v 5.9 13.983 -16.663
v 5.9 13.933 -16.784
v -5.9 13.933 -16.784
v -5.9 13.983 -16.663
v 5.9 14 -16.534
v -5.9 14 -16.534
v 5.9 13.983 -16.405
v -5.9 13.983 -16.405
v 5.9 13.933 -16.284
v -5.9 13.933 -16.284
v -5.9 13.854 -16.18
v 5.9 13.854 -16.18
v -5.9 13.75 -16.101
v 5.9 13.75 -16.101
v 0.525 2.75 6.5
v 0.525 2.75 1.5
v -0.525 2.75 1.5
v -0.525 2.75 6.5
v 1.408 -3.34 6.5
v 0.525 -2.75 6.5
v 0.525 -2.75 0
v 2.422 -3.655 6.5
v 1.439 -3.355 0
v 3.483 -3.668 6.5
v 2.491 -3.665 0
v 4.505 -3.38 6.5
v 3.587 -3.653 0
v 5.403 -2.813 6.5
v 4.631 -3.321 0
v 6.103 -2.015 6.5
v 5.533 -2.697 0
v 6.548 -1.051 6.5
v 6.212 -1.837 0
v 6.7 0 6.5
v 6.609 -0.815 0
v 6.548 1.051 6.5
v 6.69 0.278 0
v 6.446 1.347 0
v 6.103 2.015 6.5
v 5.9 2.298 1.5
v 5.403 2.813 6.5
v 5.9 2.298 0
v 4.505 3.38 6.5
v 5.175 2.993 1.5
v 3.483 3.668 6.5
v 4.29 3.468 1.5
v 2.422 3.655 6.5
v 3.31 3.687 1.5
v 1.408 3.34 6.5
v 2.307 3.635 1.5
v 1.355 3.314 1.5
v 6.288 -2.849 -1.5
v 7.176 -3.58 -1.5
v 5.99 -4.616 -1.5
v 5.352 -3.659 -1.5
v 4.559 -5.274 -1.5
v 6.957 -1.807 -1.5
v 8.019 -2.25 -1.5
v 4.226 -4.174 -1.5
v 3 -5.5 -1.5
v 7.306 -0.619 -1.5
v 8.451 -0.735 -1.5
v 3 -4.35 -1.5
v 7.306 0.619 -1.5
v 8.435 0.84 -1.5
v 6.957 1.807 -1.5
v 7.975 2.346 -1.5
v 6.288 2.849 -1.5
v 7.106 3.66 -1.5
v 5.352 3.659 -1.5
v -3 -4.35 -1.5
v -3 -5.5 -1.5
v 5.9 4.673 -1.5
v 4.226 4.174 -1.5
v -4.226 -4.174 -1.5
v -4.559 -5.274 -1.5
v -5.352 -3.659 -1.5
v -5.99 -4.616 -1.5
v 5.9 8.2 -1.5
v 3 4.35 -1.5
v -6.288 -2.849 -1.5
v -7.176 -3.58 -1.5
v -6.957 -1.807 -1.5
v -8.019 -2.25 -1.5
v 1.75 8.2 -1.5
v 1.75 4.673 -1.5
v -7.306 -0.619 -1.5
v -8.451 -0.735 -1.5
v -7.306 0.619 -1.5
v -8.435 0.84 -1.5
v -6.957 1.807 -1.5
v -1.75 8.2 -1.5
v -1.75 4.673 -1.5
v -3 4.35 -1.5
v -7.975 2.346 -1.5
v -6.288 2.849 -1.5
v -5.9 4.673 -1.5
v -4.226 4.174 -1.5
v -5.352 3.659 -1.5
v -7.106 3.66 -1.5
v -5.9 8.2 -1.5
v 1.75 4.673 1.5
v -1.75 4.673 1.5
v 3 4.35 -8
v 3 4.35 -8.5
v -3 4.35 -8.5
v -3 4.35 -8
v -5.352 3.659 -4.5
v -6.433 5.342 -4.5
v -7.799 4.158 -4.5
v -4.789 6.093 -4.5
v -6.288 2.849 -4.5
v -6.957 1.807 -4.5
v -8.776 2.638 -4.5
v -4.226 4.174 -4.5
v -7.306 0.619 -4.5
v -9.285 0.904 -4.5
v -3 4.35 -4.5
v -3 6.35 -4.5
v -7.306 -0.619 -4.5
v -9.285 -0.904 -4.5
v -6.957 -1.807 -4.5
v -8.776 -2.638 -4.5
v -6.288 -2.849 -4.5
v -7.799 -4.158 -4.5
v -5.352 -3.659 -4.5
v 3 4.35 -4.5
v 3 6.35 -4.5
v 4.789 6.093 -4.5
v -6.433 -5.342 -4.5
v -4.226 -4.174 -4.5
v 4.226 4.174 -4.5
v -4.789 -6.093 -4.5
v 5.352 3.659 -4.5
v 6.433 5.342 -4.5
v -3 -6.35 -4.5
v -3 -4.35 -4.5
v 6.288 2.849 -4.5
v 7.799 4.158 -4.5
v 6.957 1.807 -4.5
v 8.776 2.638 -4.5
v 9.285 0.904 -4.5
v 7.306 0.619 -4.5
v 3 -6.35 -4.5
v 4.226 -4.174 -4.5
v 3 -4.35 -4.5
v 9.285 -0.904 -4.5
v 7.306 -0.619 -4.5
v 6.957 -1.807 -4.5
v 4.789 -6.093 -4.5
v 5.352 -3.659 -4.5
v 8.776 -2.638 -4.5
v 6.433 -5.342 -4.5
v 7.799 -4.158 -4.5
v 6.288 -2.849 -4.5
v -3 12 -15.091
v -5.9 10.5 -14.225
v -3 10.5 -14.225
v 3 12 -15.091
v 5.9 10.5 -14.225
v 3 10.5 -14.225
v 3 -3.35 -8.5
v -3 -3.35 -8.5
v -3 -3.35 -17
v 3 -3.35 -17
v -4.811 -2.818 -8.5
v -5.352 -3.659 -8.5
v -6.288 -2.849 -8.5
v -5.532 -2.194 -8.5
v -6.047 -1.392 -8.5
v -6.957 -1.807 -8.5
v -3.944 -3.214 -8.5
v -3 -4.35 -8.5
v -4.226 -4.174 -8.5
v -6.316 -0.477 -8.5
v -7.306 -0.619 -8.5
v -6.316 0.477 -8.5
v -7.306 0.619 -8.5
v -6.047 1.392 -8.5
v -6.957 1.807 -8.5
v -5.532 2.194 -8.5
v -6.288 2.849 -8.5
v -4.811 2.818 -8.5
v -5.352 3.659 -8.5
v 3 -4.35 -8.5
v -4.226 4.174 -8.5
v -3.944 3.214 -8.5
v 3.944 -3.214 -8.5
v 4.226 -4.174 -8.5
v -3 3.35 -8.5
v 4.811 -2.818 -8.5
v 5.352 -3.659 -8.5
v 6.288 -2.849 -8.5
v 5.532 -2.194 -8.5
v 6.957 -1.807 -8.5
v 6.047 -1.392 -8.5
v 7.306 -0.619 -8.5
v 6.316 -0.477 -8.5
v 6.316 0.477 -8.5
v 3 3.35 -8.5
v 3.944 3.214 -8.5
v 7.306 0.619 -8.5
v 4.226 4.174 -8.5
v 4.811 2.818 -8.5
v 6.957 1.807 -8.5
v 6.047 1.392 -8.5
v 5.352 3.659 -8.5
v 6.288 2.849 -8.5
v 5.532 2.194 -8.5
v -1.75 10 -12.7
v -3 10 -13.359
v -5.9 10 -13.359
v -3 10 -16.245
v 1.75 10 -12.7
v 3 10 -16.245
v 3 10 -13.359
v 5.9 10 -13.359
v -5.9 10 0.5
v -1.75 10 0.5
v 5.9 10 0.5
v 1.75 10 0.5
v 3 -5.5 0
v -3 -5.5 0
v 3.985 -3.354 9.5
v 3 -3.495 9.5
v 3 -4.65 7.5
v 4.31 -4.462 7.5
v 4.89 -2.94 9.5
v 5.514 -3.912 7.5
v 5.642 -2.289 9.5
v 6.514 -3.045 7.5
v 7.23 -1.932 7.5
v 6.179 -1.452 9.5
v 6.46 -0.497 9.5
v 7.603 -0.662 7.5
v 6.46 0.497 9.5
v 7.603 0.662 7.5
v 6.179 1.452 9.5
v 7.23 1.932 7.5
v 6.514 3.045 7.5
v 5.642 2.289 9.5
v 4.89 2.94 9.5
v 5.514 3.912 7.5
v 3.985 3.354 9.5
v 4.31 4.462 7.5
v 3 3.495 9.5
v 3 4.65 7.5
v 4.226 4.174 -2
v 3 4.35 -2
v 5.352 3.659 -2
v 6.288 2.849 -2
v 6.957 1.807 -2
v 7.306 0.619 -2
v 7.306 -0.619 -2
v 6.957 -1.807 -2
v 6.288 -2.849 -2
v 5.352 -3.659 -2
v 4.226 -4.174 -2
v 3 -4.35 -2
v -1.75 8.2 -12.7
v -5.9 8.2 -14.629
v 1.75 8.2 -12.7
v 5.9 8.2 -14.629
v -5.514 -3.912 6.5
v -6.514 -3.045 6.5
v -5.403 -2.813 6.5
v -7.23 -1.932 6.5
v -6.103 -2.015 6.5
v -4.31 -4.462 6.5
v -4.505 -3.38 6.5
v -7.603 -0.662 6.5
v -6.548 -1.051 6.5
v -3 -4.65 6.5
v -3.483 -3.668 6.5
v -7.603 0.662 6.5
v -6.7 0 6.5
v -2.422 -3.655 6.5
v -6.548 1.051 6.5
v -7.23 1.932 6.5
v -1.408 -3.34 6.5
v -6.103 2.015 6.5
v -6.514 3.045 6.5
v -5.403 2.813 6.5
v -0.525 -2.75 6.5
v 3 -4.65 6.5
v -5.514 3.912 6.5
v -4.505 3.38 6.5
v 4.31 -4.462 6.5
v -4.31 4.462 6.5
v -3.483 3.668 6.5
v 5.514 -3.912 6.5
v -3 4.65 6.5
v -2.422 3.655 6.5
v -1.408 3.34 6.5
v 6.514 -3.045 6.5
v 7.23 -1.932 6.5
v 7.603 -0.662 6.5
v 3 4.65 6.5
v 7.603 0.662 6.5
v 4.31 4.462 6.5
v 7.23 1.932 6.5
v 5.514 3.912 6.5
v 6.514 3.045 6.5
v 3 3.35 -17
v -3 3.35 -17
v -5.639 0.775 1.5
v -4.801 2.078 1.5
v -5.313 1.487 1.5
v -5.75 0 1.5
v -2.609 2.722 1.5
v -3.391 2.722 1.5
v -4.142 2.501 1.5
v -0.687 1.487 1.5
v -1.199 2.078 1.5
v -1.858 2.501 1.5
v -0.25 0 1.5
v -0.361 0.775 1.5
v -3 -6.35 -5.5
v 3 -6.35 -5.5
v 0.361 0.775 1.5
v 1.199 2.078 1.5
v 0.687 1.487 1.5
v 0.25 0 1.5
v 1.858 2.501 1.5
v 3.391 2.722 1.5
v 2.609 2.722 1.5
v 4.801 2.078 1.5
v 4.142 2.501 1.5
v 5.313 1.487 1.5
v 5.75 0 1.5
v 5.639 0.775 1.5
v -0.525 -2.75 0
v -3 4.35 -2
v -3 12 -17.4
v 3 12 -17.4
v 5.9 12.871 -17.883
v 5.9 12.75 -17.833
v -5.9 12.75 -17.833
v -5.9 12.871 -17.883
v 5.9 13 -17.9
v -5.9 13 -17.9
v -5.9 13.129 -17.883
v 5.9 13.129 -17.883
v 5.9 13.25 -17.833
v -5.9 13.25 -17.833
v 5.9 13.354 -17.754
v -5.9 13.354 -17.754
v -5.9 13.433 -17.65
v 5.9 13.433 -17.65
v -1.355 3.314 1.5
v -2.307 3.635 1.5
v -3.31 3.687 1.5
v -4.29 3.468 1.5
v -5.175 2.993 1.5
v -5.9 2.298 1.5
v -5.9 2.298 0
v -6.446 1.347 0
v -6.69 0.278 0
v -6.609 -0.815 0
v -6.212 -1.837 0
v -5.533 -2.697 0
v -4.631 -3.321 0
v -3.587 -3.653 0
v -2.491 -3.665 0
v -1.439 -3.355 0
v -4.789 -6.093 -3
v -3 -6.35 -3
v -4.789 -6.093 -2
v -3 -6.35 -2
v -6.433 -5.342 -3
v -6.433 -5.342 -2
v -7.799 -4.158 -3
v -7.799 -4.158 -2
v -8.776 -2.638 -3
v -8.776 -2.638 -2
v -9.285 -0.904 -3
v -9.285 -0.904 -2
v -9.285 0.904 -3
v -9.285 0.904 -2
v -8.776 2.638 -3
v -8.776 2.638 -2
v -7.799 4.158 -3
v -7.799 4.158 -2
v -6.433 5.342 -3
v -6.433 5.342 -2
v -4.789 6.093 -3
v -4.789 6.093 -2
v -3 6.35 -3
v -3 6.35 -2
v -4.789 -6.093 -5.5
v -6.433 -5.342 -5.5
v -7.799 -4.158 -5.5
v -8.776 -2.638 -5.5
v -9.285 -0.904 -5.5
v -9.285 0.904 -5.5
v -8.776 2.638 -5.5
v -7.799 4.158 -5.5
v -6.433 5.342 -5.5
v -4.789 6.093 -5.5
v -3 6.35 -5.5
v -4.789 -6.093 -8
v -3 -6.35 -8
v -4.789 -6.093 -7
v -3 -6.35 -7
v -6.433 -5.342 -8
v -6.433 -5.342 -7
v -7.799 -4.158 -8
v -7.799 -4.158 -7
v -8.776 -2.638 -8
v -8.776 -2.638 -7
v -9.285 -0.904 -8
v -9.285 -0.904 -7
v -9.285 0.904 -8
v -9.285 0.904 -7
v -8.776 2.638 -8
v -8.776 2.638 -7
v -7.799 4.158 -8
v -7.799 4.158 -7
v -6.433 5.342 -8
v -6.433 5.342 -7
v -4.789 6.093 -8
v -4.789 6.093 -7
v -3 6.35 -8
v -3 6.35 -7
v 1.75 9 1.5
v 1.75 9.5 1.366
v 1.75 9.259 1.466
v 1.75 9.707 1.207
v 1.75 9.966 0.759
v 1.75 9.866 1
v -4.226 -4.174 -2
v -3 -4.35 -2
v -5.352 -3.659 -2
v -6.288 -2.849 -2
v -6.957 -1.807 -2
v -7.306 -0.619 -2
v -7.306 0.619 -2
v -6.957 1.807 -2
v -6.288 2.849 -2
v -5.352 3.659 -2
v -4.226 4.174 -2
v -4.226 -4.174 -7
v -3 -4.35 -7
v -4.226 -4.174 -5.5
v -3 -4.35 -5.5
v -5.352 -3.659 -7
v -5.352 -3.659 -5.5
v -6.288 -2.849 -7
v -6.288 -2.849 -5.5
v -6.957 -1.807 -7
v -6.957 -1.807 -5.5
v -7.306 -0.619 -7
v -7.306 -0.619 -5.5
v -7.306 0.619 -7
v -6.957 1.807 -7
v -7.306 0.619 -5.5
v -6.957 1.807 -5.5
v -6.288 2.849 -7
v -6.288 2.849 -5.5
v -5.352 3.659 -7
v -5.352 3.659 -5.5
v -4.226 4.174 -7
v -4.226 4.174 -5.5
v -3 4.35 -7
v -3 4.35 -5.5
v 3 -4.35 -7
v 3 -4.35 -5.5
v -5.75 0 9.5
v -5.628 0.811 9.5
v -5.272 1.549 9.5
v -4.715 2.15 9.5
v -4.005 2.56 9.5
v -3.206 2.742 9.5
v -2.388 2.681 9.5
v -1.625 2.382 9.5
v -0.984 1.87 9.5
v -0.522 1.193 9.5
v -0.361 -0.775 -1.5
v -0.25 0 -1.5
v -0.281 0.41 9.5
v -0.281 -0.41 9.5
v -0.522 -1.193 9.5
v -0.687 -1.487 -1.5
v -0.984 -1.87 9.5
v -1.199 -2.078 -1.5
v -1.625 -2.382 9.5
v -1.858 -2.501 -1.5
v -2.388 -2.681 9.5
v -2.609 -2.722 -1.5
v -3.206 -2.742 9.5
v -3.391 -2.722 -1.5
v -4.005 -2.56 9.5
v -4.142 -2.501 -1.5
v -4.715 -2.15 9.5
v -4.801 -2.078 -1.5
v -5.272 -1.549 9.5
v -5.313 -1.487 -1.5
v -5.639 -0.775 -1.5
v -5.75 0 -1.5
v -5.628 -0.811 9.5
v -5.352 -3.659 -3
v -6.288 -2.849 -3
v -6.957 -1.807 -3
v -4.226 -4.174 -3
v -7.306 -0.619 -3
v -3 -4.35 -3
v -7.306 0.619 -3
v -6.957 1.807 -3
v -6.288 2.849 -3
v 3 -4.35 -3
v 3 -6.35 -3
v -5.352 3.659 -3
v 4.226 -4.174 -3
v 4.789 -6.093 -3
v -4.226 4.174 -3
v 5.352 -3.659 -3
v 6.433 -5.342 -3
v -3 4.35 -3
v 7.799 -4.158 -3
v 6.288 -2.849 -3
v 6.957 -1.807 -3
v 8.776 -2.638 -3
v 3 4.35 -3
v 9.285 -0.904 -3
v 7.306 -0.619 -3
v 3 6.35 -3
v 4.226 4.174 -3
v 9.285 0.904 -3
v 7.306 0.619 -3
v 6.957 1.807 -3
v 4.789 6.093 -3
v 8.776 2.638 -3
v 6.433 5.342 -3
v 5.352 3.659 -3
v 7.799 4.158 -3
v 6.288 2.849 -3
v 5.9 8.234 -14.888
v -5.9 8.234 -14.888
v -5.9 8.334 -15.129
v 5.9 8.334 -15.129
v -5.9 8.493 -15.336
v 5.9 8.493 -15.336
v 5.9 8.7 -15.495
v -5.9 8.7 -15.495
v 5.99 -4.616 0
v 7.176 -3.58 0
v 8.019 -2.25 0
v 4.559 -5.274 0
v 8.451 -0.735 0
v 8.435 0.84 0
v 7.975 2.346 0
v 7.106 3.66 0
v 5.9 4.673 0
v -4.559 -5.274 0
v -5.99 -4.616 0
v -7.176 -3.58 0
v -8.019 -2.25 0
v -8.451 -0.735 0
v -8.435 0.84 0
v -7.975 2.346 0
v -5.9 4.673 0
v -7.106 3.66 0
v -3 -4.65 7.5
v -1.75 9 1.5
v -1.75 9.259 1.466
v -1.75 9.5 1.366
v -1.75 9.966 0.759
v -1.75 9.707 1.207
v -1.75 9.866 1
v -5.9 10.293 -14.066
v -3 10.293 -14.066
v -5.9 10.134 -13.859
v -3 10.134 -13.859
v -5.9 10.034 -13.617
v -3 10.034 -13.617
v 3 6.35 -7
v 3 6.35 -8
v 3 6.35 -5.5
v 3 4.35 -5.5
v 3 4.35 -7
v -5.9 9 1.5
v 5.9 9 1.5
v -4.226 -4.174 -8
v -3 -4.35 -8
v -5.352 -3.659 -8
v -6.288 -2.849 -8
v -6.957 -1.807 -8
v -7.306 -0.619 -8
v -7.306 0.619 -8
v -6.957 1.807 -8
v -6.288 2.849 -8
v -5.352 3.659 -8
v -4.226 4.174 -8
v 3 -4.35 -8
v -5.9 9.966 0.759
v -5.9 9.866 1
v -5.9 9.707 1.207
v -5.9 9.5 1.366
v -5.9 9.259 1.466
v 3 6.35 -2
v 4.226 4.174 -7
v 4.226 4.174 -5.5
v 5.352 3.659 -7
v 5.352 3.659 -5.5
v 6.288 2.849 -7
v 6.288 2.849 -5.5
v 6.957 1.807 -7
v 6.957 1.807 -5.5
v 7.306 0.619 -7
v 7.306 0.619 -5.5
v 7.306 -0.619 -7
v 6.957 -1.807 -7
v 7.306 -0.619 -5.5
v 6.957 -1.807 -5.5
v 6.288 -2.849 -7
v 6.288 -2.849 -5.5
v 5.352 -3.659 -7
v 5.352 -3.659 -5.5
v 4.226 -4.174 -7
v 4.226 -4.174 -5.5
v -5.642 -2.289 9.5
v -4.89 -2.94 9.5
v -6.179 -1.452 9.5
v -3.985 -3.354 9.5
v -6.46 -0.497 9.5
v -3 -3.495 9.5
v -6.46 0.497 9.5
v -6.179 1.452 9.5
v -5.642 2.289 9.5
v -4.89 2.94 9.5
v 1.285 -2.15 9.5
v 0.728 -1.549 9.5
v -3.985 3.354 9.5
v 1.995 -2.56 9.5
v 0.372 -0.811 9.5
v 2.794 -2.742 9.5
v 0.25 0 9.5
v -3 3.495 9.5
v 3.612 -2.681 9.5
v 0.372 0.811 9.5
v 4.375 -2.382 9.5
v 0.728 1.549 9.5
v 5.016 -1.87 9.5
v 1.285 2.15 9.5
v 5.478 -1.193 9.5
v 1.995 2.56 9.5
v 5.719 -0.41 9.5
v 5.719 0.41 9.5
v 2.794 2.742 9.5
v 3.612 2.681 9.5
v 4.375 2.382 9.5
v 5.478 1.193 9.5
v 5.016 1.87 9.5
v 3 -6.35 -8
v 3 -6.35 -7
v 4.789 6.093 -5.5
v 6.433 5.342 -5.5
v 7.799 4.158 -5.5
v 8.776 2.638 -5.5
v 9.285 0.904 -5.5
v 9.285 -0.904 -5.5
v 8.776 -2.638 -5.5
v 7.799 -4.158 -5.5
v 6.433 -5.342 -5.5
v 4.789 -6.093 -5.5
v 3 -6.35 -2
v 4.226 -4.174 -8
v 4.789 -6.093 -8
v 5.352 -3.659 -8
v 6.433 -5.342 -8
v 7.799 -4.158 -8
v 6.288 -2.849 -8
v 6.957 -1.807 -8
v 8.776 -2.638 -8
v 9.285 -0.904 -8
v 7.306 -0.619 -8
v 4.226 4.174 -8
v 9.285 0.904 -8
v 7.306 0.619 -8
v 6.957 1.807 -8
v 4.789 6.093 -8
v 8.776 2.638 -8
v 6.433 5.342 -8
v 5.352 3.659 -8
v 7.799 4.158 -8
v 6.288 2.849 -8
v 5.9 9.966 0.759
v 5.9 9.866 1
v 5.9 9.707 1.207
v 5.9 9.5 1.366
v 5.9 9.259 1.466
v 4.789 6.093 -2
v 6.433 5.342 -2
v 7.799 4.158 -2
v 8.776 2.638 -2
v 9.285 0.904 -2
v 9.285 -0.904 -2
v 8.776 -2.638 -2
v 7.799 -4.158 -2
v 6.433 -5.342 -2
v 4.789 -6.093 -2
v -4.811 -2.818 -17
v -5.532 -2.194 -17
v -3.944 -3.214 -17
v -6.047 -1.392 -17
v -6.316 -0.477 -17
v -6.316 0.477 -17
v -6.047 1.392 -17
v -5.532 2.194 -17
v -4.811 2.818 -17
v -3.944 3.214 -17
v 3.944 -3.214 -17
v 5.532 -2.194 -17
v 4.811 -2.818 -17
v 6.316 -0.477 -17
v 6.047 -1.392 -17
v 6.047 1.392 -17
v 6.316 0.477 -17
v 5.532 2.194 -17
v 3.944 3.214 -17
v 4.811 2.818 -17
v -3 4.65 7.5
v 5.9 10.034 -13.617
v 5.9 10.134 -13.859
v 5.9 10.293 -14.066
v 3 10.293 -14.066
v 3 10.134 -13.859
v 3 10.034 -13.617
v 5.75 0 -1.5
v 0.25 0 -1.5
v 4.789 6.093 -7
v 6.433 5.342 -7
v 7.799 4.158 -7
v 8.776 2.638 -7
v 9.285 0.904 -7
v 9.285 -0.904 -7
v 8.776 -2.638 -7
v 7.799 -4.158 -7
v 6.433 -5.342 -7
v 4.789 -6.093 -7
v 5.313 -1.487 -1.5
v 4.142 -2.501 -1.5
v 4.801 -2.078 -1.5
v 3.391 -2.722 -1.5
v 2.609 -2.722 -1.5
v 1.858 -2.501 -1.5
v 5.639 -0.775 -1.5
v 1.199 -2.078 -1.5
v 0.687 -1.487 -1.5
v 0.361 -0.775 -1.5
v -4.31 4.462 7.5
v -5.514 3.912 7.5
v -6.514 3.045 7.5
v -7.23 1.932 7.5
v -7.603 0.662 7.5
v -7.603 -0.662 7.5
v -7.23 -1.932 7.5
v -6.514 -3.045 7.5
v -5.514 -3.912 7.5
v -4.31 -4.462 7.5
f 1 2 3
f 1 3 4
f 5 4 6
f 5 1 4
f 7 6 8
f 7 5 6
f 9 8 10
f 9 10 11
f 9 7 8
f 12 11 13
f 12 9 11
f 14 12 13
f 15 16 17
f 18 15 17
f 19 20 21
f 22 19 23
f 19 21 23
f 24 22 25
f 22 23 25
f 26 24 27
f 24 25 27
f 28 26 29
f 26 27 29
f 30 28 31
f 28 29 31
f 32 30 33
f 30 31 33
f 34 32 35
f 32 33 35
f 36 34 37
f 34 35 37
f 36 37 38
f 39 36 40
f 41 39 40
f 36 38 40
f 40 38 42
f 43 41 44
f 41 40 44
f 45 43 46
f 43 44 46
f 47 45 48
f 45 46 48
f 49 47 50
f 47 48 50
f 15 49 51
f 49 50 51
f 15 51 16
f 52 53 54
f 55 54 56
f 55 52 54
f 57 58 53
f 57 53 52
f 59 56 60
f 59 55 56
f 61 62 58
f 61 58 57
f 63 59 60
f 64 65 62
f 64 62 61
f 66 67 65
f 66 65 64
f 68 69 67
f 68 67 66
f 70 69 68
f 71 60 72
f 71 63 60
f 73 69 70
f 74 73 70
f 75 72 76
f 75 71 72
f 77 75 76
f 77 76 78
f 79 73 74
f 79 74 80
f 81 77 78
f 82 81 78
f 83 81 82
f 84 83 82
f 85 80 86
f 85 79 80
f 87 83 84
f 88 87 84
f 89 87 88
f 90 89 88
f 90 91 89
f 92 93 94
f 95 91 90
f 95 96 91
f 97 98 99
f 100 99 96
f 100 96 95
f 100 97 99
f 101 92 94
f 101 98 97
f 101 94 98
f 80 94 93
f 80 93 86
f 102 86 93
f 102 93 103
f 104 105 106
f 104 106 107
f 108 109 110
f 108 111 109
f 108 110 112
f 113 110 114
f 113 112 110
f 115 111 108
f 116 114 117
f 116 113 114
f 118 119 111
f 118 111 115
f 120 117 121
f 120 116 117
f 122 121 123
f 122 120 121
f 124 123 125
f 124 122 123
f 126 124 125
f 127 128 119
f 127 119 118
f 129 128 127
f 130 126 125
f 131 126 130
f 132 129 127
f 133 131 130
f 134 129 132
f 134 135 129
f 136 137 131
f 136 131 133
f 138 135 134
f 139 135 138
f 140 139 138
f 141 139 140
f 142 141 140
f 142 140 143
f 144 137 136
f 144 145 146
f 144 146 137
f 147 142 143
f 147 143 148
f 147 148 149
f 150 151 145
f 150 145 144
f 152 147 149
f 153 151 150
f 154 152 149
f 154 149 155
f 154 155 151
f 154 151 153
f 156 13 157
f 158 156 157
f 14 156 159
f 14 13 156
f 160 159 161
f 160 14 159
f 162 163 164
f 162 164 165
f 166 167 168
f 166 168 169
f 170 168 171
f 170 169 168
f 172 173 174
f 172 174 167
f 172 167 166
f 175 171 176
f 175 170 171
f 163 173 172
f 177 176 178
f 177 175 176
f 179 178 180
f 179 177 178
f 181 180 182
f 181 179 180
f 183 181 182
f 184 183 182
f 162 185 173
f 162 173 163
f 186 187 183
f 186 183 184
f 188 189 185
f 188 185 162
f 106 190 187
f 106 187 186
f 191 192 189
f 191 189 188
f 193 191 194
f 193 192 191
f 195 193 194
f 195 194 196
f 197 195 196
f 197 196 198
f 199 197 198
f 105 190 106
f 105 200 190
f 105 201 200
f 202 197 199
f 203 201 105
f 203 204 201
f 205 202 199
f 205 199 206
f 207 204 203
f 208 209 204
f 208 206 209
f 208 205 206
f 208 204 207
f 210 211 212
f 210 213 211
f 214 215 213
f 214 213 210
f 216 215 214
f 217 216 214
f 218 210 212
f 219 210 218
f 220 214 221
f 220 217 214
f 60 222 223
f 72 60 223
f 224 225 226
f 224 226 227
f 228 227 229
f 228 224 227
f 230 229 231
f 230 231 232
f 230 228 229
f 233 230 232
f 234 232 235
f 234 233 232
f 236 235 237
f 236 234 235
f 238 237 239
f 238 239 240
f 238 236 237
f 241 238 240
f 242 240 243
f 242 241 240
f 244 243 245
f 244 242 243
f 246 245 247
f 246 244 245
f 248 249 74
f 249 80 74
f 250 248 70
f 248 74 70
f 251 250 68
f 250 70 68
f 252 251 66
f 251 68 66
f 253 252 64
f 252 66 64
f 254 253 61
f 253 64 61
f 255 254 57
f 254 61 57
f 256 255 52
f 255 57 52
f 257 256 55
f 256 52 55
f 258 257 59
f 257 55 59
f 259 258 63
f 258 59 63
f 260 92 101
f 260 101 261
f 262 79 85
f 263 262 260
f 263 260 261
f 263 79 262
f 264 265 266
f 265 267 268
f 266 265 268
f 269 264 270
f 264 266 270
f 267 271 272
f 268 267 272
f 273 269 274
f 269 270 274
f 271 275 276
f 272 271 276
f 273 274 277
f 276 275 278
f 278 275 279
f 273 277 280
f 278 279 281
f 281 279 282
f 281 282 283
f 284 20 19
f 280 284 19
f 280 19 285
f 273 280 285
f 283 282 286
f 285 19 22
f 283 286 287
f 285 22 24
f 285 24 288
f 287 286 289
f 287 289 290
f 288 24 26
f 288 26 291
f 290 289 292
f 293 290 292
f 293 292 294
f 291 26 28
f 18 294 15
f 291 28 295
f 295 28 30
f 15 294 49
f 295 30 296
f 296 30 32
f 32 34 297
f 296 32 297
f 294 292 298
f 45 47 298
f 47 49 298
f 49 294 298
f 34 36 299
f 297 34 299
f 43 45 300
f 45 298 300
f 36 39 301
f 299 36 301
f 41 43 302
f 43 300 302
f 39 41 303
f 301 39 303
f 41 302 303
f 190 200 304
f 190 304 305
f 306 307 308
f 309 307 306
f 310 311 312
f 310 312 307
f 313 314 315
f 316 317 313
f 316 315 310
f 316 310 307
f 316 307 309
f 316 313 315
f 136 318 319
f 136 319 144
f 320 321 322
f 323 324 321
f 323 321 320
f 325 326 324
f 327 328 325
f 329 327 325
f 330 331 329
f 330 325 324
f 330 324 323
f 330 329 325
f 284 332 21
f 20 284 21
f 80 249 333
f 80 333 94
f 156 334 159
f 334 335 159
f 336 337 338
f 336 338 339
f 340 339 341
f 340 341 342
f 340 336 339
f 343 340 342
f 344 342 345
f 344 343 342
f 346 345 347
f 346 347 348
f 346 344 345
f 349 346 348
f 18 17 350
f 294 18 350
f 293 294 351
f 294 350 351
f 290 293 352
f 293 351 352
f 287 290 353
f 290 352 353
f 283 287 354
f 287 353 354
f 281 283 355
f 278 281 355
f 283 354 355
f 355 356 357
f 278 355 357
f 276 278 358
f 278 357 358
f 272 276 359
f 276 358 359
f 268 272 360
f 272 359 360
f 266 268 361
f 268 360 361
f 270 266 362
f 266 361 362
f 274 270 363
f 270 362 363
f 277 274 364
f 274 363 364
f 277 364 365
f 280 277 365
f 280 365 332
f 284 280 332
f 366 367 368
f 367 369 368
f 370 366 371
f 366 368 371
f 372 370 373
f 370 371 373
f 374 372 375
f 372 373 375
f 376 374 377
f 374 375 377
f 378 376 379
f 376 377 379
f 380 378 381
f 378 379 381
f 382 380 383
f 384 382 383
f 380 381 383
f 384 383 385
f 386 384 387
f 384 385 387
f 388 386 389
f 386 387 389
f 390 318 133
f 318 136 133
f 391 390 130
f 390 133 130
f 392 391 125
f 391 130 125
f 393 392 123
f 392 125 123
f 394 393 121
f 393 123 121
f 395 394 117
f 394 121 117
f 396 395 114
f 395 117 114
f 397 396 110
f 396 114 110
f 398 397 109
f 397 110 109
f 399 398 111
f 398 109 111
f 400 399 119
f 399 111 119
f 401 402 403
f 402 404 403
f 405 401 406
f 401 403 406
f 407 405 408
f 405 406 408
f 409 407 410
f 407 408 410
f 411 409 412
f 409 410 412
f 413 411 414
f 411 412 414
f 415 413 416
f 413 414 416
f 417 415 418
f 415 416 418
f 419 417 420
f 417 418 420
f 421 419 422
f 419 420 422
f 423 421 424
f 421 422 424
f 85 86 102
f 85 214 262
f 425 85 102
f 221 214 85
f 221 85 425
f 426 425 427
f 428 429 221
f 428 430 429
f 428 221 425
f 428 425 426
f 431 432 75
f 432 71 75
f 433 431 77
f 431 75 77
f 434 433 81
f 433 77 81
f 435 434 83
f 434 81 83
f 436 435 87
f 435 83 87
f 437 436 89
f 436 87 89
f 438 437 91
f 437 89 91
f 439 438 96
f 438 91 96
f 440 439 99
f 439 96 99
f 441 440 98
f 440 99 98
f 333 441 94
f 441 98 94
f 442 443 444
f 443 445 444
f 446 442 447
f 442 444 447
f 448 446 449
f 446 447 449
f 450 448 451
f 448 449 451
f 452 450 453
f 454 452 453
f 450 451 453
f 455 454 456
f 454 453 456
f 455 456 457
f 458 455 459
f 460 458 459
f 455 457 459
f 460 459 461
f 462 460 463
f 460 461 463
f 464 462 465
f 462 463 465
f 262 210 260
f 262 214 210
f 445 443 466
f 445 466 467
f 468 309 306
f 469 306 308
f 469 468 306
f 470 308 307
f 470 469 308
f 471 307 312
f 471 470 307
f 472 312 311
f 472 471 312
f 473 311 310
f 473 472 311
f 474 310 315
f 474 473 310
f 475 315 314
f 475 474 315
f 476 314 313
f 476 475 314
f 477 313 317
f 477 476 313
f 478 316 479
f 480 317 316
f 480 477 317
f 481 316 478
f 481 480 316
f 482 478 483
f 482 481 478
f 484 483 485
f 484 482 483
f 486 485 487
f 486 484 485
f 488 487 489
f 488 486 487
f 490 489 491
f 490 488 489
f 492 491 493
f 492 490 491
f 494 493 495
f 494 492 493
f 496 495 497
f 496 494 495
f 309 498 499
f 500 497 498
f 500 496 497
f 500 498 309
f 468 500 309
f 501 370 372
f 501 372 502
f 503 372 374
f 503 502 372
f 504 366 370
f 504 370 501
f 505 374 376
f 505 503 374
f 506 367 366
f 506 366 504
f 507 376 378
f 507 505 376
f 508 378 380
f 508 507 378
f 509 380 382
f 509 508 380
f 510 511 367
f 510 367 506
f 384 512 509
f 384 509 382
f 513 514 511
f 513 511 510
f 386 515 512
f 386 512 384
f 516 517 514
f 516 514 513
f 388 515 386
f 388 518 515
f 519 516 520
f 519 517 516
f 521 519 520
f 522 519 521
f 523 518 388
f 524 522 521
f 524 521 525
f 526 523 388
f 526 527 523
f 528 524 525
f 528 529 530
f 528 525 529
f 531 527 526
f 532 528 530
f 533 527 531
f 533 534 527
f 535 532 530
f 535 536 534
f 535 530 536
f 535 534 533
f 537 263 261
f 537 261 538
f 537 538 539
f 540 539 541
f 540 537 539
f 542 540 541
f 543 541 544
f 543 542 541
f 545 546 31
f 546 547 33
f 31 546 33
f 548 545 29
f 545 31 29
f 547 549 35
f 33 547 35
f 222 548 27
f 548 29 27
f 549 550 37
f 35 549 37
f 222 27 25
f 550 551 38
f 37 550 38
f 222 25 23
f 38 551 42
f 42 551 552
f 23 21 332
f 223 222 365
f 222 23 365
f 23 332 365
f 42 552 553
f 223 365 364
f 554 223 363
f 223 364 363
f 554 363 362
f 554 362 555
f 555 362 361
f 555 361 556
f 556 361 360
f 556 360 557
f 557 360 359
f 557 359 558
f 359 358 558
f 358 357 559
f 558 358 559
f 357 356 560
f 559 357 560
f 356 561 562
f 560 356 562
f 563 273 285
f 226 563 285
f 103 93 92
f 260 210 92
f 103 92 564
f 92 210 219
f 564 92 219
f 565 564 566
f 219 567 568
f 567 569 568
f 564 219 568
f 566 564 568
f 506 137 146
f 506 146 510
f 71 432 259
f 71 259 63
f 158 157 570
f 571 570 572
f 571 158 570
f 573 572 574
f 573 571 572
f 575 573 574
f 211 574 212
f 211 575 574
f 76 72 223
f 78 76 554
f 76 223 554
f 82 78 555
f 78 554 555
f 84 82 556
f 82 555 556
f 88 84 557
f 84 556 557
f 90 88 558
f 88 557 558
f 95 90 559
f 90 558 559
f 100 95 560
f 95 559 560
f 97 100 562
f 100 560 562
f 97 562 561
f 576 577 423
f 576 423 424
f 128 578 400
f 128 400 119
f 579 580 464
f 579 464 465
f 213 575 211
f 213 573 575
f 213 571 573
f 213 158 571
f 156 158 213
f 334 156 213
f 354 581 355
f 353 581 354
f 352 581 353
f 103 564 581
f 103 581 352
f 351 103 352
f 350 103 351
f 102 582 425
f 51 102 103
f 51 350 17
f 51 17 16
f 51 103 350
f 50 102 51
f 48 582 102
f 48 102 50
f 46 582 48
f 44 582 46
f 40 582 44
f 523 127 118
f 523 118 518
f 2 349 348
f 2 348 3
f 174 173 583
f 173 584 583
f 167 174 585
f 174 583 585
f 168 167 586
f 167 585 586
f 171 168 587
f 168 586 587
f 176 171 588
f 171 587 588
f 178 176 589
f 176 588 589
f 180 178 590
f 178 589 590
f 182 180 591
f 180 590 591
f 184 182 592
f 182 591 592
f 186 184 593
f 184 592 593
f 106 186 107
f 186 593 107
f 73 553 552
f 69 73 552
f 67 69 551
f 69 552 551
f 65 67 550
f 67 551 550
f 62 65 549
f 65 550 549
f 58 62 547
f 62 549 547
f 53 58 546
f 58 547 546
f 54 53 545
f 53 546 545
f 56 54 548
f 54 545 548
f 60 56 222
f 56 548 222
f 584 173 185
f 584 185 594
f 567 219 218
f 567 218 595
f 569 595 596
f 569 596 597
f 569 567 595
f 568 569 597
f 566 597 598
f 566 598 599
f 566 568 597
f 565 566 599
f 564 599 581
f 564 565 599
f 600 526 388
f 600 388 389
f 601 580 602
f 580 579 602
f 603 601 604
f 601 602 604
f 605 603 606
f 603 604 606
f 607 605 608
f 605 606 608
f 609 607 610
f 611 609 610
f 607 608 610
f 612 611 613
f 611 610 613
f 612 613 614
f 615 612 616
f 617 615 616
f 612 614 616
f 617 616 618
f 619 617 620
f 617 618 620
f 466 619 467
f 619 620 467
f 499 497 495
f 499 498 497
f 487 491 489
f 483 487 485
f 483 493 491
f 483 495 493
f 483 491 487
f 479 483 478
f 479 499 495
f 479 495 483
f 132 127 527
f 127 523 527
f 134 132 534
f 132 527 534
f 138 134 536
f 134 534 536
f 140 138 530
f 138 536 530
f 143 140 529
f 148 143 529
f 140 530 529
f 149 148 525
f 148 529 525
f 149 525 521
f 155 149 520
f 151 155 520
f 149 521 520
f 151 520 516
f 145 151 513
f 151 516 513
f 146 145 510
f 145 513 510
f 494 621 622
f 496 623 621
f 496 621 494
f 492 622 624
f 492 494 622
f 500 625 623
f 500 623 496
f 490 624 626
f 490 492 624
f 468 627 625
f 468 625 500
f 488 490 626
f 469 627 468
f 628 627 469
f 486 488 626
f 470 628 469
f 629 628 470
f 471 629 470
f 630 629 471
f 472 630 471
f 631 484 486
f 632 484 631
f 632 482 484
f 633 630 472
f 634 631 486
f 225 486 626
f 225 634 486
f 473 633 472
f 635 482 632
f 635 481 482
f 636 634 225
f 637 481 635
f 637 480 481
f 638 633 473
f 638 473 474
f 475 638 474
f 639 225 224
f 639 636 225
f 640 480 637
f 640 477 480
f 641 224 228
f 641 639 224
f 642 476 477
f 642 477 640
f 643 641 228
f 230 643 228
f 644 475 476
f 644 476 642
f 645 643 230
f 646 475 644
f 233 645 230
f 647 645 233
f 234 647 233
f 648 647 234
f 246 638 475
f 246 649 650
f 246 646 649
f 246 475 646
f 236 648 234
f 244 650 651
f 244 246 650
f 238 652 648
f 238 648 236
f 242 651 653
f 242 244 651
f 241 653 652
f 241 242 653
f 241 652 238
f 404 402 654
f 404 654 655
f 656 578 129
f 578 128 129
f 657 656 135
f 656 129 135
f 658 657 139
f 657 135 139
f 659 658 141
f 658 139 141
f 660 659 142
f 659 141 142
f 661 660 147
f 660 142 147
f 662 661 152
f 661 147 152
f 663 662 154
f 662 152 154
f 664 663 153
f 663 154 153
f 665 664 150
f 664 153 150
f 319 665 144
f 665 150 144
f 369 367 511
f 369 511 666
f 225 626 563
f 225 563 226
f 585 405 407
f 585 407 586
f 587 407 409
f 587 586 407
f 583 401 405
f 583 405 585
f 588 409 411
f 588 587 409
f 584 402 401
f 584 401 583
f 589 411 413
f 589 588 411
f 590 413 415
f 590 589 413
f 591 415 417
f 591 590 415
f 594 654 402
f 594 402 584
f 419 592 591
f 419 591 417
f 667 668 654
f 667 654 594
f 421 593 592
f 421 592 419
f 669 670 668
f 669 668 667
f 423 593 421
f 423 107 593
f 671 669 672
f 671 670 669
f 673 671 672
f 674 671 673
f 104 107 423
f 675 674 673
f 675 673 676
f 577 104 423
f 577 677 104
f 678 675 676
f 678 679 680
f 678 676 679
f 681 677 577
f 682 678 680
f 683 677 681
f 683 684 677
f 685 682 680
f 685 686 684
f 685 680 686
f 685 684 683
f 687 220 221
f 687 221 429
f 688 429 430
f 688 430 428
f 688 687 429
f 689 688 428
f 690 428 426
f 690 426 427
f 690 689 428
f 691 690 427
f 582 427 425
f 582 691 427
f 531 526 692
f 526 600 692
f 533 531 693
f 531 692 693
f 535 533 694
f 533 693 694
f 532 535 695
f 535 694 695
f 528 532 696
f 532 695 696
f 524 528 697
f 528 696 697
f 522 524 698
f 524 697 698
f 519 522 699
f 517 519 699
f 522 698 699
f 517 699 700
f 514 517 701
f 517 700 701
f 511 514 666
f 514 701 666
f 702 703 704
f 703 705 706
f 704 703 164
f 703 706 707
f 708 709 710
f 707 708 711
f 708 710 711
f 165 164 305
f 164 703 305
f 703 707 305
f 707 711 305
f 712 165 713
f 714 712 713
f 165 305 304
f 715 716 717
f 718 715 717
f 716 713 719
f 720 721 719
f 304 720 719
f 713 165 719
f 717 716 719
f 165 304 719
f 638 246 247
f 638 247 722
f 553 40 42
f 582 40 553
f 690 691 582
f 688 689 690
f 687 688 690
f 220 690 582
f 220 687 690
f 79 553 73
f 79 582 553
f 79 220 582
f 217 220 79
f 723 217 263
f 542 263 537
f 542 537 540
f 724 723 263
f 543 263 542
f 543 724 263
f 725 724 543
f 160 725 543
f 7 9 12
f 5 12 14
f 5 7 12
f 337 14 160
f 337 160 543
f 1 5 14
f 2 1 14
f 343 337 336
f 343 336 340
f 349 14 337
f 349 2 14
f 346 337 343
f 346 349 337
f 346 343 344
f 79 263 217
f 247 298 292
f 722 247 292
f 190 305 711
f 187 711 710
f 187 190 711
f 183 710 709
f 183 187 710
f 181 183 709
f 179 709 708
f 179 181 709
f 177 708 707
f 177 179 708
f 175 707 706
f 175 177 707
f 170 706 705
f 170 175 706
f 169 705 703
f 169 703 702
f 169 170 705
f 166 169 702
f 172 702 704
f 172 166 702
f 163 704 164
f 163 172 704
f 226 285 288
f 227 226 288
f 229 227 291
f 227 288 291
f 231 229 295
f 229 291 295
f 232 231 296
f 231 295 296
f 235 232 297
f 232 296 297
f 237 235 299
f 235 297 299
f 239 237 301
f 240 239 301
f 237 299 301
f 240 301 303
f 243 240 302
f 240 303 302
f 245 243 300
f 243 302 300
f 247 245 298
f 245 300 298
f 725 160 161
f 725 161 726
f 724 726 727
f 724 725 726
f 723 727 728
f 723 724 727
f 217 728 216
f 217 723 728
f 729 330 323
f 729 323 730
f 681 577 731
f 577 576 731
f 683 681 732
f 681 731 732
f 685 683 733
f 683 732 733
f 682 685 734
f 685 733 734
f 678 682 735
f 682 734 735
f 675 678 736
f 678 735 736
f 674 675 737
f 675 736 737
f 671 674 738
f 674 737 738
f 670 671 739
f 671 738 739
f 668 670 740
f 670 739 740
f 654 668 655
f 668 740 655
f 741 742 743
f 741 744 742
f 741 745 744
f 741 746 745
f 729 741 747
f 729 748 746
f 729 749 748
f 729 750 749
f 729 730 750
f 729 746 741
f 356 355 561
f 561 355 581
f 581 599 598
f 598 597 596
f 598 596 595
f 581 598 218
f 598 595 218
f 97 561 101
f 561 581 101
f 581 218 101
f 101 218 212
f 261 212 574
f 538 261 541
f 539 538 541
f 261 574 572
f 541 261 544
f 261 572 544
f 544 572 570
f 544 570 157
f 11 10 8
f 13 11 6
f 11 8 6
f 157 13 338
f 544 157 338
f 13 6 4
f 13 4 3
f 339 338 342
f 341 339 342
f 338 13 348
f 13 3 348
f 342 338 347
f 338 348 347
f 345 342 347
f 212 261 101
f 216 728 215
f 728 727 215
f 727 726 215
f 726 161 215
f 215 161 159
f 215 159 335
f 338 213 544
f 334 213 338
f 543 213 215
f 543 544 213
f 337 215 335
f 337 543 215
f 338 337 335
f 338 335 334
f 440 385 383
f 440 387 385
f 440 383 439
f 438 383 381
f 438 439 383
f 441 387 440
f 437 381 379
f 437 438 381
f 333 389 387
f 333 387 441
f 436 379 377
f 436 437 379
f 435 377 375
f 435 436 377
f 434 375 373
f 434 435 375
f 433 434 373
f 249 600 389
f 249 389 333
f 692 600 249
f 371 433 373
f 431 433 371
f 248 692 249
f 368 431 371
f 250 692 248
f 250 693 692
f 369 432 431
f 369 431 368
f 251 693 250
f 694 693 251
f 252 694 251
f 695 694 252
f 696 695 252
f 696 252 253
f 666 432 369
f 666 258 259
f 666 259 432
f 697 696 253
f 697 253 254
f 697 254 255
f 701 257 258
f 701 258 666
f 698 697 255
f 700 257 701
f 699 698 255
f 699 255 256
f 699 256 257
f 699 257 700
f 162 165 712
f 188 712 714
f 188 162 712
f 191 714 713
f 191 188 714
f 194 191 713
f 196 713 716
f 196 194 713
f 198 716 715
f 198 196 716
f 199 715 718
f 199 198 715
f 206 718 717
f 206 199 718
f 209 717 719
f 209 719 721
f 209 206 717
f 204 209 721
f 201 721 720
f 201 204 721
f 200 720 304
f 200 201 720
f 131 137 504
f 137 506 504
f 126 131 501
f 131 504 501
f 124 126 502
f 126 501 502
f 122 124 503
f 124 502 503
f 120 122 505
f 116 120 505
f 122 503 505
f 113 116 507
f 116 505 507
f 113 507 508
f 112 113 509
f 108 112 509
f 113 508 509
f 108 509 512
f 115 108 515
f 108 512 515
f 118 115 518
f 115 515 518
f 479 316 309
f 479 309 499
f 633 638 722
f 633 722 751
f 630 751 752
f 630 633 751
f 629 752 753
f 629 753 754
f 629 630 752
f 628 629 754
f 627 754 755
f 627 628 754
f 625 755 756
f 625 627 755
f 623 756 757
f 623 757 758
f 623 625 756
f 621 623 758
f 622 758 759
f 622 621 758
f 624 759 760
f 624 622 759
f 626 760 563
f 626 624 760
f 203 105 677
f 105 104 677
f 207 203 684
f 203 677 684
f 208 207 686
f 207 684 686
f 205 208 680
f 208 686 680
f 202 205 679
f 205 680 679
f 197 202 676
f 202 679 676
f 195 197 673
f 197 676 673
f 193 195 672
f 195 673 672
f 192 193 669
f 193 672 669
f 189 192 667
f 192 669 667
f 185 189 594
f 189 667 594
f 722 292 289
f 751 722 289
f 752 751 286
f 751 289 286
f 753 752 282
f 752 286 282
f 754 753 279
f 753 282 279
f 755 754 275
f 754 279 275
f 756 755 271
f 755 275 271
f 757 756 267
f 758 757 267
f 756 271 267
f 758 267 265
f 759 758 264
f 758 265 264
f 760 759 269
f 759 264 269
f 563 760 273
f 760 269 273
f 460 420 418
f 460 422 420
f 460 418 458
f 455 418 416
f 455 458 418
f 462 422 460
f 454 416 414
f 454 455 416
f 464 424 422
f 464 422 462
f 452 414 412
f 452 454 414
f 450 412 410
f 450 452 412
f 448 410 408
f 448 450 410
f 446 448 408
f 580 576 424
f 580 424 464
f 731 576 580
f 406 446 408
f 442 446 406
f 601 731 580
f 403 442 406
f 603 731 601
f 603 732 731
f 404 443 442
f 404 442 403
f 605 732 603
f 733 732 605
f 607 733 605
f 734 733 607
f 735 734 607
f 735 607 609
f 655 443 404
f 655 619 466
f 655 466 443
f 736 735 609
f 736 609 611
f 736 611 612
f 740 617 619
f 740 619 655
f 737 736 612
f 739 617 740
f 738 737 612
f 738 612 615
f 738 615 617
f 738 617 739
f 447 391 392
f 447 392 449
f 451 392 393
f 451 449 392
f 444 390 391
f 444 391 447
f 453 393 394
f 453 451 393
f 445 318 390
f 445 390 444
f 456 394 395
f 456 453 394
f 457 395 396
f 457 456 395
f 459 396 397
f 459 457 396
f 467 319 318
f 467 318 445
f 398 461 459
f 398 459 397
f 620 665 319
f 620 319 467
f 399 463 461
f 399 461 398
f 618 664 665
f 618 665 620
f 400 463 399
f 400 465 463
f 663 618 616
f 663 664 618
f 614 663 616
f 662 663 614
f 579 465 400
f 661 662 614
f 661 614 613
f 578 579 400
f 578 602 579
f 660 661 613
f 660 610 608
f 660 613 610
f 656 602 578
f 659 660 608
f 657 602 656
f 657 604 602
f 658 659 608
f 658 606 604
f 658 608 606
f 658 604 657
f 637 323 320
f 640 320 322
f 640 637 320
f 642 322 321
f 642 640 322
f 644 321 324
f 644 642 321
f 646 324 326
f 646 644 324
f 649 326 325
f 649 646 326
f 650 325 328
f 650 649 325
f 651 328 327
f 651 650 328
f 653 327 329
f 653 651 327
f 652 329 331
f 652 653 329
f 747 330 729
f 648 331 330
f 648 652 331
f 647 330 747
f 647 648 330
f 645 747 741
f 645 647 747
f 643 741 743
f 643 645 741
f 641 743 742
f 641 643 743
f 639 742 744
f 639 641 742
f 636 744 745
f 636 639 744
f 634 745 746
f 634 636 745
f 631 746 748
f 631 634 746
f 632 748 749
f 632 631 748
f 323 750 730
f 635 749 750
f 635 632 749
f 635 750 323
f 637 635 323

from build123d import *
from OCP.BRepFilletAPI import BRepFilletAPI_MakeChamfer

# Parameters (mm, degrees)
SKETCH1_R          = 2.75
EXTRUDE1_DEPTH     = 6.5
SKETCH2_R          = 2.75
EXTRUDE2_DEPTH     = 3
CHAMFER1_SIZE      = 2
CHAMFER1_SIZE2     = 1.154700538
SKETCH4_R          = 2.75
EXTRUDE3_DEPTH     = 1.5
EXTRUDE4_DEPTH     = 5.9
EXTRUDE5_DEPTH     = 15.5
CUT_EXTRUDE1_DEPTH = 3
CUT_EXTRUDE2_DEPTH = 1.75


with BuildPart() as part:
    # Sketch1 → Extrude1 (new body)
    with BuildSketch(Plane.XY):
        with BuildLine():
            Line((0.524621241, 2.75), (-0.524621241, 2.75))
            ThreePointArc((-0.524621241, 2.75), (-6.7, 0), (-0.524621241, -2.75))
            Line((-0.524621241, -2.75), (0.524621241, -2.75))
            ThreePointArc((0.524621241, -2.75), (6.7, 0), (0.524621241, 2.75))
        make_face()
        with Locations(Location((3, 0, 0), (0, 0, 180))):
            Circle(SKETCH1_R, mode=Mode.SUBTRACT)
        with Locations(Location((-3, 0, 0), (0, 0, 180))):
            Circle(SKETCH1_R, mode=Mode.SUBTRACT)
    extrude(amount=EXTRUDE1_DEPTH)

    # Sketch2 → Extrude2 (add)
    with BuildSketch(Plane.XY.offset(6.5)):
        with BuildLine():
            Line((3, 4.65), (-3, 4.65))
            ThreePointArc((-3, 4.65), (-7.65, 0), (-3, -4.65))
            Line((-3, -4.65), (3, -4.65))
            ThreePointArc((3, -4.65), (7.65, 0), (3, 4.65))
        make_face()
        with Locations(Location((3, 0, 0), (0, 0, 180))):
            Circle(SKETCH2_R, mode=Mode.SUBTRACT)
        with Locations(Location((-3, 0, 0), (0, 0, 180))):
            Circle(SKETCH2_R, mode=Mode.SUBTRACT)
    extrude(amount=EXTRUDE2_DEPTH)

    # Chamfer1: one chamfer whose edges measure the first distance from different faces: ONE call of the kernel's chamfer builder (chamfer() names one face for all edges)
    chamfer1_edges_1 = [part.edges().sort_by_distance(p)[0] for p in [
        (7.65, 0, 9.5),
    ]]
    chamfer1_side_1 = [part.faces().sort_by_distance(p)[0] for p in [
        (7.65, 0, 8),
    ]]
    chamfer1_edges_2 = [part.edges().sort_by_distance(p)[0] for p in [
        (0, 4.65, 9.5),
    ]]
    chamfer1_side_2 = [part.faces().sort_by_distance(p)[0] for p in [
        (0, 4.65, 8),
    ]]
    chamfer1_edges_3 = [part.edges().sort_by_distance(p)[0] for p in [
        (-7.65, 0, 9.5),
    ]]
    chamfer1_side_3 = [part.faces().sort_by_distance(p)[0] for p in [
        (-7.65, 0, 8),
    ]]
    chamfer1_edges_4 = [part.edges().sort_by_distance(p)[0] for p in [
        (0, -4.65, 9.5),
    ]]
    chamfer1_side_4 = [part.faces().sort_by_distance(p)[0] for p in [
        (0, -4.65, 8),
    ]]
    chamfer1 = BRepFilletAPI_MakeChamfer(part.part.solid().wrapped)
    for e in chamfer1_edges_1:
        chamfer1.Add(CHAMFER1_SIZE, CHAMFER1_SIZE2, e.wrapped, chamfer1_side_1[0].wrapped)  # the first distance lies on this face
    for e in chamfer1_edges_2:
        chamfer1.Add(CHAMFER1_SIZE, CHAMFER1_SIZE2, e.wrapped, chamfer1_side_2[0].wrapped)  # the first distance lies on this face
    for e in chamfer1_edges_3:
        chamfer1.Add(CHAMFER1_SIZE, CHAMFER1_SIZE2, e.wrapped, chamfer1_side_3[0].wrapped)  # the first distance lies on this face
    for e in chamfer1_edges_4:
        chamfer1.Add(CHAMFER1_SIZE, CHAMFER1_SIZE2, e.wrapped, chamfer1_side_4[0].wrapped)  # the first distance lies on this face
    add(Compound.cast(chamfer1.Shape()), mode=Mode.REPLACE)

    # Sketch4 → Extrude3 (add)
    with BuildSketch(Plane(origin=(0, 0, 0), x_dir=(-1, 0, 0), z_dir=(0, 0, -1))):
        with BuildLine():
            Line((3, 5.5), (-3, 5.5))
            ThreePointArc((-3, 5.5), (-8.5, 0), (-3, -5.5))
            Line((-3, -5.5), (3, -5.5))
            ThreePointArc((3, -5.5), (8.5, 0), (3, 5.5))
        make_face()
        with Locations((3, 0)):
            Circle(SKETCH4_R, mode=Mode.SUBTRACT)
        with Locations((-3, 0)):
            Circle(SKETCH4_R, mode=Mode.SUBTRACT)
    extrude(amount=EXTRUDE3_DEPTH)

    # Sketch5 → Extrude4 (add, symmetric)
    with BuildSketch(Plane(origin=(0, 0, 0), x_dir=(0, 0, -1), z_dir=(1, 0, 0))):
        with BuildLine():
            Line((1.5, 0), (1.5, 8.2))
            Line((1.5, 8.2), (14.628718708, 8.2))
            ThreePointArc((14.628718708, 8.2), (15.128718708, 8.333974596), (15.494744112, 8.7))
            Line((15.494744112, 8.7), (17.833012702, 12.75))
            ThreePointArc((17.833012702, 12.75), (17.882962913, 13.129409523), (17.65, 13.433012702))
            Line((17.65, 13.433012702), (16.783974596, 13.933012702))
            ThreePointArc((16.783974596, 13.933012702), (16.404565074, 13.982962913), (16.100961894, 13.75))
            Line((16.100961894, 13.75), (14.224573519, 10.5))
            ThreePointArc((14.224573519, 10.5), (13.858548116, 10.133974596), (13.358548116, 10))
            Line((13.358548116, 10), (-0.5, 10))
            ThreePointArc((-0.5, 10), (-1.207106781, 9.707106781), (-1.5, 9))
            Line((-1.5, 9), (-1.5, 0))
            Line((-1.5, 0), (1.5, 0))
        make_face()
    extrude(amount=EXTRUDE4_DEPTH, both=True)

    # Sketch6 → Extrude5 (add)
    with BuildSketch(Plane(origin=(0, 0, -1.5), x_dir=(-1, 0, 0), z_dir=(0, 0, -1))):
        with BuildLine():
            Line((-3, 3.35), (3, 3.35))
            ThreePointArc((3, 3.35), (6.35, 0), (3, -3.35))
            Line((3, -3.35), (-3, -3.35))
            ThreePointArc((-3, -3.35), (-6.35, 0), (-3, 3.35))
        make_face()
    extrude(amount=EXTRUDE5_DEPTH)

    # Sketch10 → Cut-Extrude1 (cut, symmetric)
    with BuildSketch(Plane(origin=(0, 0, 0), x_dir=(0, 0, -1), z_dir=(1, 0, 0))):
        Polygon((17.4, 12), (15.090598923, 12), (13.358548116, 10), (16.245299462, 10), align=None)
    extrude(amount=CUT_EXTRUDE1_DEPTH, both=True, mode=Mode.SUBTRACT)

    # Sketch11 → Cut-Extrude2 (cut, symmetric)
    with BuildSketch(Plane(origin=(0, 0, 0), x_dir=(0, 0, -1), z_dir=(1, 0, 0))):
        Polygon((1.5, 4.673328578), (-1.5, 4.673328578), (-1.5, 10), (12.7, 10), (12.7, 8.2), (1.5, 8.2), align=None)
    extrude(amount=CUT_EXTRUDE2_DEPTH, both=True, mode=Mode.SUBTRACT)

    # Bælg: sweep along a path in Sketch8
    with BuildLine(Plane(origin=(0, 0, -1.5), x_dir=(-1, 0, 0), z_dir=(0, 0, -1))) as b_lg_path:
        Line((3, 3.35), (-3, 3.35))
        ThreePointArc((-3, 3.35), (-6.35, 0), (-3, -3.35))
        Line((-3, -3.35), (3, -3.35))
        ThreePointArc((3, -3.35), (6.35, 0), (3, 3.35))
    # Sketch7 → Bælg (sweep)
    with BuildSketch(Plane(origin=(0, 0, 0), x_dir=(0, 0, -1), z_dir=(1, 0, 0))):
        Polygon((8.5, 3.35), (1.5, 3.35), (1.5, 4.35), (2, 4.35), (2, 6.35), (3, 6.35), (3, 4.35), (4.5, 4.35), (4.5, 6.35), (5.5, 6.35), (5.5, 4.35), (7, 4.35), (7, 6.35), (8, 6.35), (8, 4.35), (8.5, 4.35), align=None)
    sweep(path=b_lg_path.line)


solid = part.part
